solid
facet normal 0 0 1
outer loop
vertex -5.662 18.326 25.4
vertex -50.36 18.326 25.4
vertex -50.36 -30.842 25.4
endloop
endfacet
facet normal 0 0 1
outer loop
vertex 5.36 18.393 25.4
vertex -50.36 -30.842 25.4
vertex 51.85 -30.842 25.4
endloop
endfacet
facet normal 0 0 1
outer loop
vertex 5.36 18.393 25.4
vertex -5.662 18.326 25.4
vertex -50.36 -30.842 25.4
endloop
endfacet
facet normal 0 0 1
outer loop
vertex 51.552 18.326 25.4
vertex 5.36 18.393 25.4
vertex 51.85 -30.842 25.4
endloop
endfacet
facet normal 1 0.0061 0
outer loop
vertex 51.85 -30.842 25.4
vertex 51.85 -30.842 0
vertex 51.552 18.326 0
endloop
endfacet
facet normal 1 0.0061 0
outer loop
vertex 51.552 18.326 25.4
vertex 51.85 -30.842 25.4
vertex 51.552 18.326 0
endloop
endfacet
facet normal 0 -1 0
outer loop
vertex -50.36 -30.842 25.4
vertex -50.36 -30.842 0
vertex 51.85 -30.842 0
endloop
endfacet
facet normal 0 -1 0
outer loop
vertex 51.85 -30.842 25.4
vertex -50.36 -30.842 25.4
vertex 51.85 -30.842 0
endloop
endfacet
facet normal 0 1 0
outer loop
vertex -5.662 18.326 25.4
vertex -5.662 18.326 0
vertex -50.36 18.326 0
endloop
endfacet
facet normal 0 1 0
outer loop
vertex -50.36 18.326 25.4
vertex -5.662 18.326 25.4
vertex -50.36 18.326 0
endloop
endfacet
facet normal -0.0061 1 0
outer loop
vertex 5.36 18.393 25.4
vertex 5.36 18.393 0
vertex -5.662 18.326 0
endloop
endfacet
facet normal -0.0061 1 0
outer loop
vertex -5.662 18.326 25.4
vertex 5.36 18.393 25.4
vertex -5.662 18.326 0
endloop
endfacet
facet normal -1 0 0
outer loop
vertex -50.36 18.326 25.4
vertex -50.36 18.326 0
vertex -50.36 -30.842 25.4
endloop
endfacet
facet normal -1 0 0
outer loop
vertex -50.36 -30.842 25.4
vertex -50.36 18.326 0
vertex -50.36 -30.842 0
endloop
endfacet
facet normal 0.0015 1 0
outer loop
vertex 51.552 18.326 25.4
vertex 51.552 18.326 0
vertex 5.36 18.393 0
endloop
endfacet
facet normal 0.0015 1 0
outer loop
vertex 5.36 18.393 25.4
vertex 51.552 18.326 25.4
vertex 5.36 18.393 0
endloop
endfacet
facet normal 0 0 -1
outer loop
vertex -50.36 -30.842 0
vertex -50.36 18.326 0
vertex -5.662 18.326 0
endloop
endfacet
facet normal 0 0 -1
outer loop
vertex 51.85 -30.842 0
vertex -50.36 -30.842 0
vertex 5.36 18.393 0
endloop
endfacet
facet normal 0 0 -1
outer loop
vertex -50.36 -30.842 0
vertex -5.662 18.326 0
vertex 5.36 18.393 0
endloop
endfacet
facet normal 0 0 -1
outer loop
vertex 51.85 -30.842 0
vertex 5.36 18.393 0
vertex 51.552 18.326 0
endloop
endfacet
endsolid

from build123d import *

# Parameters (mm, degrees)
F1_DEPTH = 25.4


with BuildPart() as f1:
    # F0 (on Top) → F1 (new body)
    with BuildSketch(Plane.XY):
        Polygon((-5.363799, -30.841844), (-5.661787, 18.326312), (-50.360113, 18.326312), (-50.360113, -30.841844), align=None)
        Polygon((5.359783, 18.39311), (-5.661787, 18.326312), (-5.363799, -30.841844), (5.658176, -30.841844), align=None)
        Polygon((51.552065, 18.326312), (5.359783, 18.39311), (5.658176, -30.841844), (51.850053, -30.841844), align=None)
    extrude(amount=F1_DEPTH)


solid = f1.part
